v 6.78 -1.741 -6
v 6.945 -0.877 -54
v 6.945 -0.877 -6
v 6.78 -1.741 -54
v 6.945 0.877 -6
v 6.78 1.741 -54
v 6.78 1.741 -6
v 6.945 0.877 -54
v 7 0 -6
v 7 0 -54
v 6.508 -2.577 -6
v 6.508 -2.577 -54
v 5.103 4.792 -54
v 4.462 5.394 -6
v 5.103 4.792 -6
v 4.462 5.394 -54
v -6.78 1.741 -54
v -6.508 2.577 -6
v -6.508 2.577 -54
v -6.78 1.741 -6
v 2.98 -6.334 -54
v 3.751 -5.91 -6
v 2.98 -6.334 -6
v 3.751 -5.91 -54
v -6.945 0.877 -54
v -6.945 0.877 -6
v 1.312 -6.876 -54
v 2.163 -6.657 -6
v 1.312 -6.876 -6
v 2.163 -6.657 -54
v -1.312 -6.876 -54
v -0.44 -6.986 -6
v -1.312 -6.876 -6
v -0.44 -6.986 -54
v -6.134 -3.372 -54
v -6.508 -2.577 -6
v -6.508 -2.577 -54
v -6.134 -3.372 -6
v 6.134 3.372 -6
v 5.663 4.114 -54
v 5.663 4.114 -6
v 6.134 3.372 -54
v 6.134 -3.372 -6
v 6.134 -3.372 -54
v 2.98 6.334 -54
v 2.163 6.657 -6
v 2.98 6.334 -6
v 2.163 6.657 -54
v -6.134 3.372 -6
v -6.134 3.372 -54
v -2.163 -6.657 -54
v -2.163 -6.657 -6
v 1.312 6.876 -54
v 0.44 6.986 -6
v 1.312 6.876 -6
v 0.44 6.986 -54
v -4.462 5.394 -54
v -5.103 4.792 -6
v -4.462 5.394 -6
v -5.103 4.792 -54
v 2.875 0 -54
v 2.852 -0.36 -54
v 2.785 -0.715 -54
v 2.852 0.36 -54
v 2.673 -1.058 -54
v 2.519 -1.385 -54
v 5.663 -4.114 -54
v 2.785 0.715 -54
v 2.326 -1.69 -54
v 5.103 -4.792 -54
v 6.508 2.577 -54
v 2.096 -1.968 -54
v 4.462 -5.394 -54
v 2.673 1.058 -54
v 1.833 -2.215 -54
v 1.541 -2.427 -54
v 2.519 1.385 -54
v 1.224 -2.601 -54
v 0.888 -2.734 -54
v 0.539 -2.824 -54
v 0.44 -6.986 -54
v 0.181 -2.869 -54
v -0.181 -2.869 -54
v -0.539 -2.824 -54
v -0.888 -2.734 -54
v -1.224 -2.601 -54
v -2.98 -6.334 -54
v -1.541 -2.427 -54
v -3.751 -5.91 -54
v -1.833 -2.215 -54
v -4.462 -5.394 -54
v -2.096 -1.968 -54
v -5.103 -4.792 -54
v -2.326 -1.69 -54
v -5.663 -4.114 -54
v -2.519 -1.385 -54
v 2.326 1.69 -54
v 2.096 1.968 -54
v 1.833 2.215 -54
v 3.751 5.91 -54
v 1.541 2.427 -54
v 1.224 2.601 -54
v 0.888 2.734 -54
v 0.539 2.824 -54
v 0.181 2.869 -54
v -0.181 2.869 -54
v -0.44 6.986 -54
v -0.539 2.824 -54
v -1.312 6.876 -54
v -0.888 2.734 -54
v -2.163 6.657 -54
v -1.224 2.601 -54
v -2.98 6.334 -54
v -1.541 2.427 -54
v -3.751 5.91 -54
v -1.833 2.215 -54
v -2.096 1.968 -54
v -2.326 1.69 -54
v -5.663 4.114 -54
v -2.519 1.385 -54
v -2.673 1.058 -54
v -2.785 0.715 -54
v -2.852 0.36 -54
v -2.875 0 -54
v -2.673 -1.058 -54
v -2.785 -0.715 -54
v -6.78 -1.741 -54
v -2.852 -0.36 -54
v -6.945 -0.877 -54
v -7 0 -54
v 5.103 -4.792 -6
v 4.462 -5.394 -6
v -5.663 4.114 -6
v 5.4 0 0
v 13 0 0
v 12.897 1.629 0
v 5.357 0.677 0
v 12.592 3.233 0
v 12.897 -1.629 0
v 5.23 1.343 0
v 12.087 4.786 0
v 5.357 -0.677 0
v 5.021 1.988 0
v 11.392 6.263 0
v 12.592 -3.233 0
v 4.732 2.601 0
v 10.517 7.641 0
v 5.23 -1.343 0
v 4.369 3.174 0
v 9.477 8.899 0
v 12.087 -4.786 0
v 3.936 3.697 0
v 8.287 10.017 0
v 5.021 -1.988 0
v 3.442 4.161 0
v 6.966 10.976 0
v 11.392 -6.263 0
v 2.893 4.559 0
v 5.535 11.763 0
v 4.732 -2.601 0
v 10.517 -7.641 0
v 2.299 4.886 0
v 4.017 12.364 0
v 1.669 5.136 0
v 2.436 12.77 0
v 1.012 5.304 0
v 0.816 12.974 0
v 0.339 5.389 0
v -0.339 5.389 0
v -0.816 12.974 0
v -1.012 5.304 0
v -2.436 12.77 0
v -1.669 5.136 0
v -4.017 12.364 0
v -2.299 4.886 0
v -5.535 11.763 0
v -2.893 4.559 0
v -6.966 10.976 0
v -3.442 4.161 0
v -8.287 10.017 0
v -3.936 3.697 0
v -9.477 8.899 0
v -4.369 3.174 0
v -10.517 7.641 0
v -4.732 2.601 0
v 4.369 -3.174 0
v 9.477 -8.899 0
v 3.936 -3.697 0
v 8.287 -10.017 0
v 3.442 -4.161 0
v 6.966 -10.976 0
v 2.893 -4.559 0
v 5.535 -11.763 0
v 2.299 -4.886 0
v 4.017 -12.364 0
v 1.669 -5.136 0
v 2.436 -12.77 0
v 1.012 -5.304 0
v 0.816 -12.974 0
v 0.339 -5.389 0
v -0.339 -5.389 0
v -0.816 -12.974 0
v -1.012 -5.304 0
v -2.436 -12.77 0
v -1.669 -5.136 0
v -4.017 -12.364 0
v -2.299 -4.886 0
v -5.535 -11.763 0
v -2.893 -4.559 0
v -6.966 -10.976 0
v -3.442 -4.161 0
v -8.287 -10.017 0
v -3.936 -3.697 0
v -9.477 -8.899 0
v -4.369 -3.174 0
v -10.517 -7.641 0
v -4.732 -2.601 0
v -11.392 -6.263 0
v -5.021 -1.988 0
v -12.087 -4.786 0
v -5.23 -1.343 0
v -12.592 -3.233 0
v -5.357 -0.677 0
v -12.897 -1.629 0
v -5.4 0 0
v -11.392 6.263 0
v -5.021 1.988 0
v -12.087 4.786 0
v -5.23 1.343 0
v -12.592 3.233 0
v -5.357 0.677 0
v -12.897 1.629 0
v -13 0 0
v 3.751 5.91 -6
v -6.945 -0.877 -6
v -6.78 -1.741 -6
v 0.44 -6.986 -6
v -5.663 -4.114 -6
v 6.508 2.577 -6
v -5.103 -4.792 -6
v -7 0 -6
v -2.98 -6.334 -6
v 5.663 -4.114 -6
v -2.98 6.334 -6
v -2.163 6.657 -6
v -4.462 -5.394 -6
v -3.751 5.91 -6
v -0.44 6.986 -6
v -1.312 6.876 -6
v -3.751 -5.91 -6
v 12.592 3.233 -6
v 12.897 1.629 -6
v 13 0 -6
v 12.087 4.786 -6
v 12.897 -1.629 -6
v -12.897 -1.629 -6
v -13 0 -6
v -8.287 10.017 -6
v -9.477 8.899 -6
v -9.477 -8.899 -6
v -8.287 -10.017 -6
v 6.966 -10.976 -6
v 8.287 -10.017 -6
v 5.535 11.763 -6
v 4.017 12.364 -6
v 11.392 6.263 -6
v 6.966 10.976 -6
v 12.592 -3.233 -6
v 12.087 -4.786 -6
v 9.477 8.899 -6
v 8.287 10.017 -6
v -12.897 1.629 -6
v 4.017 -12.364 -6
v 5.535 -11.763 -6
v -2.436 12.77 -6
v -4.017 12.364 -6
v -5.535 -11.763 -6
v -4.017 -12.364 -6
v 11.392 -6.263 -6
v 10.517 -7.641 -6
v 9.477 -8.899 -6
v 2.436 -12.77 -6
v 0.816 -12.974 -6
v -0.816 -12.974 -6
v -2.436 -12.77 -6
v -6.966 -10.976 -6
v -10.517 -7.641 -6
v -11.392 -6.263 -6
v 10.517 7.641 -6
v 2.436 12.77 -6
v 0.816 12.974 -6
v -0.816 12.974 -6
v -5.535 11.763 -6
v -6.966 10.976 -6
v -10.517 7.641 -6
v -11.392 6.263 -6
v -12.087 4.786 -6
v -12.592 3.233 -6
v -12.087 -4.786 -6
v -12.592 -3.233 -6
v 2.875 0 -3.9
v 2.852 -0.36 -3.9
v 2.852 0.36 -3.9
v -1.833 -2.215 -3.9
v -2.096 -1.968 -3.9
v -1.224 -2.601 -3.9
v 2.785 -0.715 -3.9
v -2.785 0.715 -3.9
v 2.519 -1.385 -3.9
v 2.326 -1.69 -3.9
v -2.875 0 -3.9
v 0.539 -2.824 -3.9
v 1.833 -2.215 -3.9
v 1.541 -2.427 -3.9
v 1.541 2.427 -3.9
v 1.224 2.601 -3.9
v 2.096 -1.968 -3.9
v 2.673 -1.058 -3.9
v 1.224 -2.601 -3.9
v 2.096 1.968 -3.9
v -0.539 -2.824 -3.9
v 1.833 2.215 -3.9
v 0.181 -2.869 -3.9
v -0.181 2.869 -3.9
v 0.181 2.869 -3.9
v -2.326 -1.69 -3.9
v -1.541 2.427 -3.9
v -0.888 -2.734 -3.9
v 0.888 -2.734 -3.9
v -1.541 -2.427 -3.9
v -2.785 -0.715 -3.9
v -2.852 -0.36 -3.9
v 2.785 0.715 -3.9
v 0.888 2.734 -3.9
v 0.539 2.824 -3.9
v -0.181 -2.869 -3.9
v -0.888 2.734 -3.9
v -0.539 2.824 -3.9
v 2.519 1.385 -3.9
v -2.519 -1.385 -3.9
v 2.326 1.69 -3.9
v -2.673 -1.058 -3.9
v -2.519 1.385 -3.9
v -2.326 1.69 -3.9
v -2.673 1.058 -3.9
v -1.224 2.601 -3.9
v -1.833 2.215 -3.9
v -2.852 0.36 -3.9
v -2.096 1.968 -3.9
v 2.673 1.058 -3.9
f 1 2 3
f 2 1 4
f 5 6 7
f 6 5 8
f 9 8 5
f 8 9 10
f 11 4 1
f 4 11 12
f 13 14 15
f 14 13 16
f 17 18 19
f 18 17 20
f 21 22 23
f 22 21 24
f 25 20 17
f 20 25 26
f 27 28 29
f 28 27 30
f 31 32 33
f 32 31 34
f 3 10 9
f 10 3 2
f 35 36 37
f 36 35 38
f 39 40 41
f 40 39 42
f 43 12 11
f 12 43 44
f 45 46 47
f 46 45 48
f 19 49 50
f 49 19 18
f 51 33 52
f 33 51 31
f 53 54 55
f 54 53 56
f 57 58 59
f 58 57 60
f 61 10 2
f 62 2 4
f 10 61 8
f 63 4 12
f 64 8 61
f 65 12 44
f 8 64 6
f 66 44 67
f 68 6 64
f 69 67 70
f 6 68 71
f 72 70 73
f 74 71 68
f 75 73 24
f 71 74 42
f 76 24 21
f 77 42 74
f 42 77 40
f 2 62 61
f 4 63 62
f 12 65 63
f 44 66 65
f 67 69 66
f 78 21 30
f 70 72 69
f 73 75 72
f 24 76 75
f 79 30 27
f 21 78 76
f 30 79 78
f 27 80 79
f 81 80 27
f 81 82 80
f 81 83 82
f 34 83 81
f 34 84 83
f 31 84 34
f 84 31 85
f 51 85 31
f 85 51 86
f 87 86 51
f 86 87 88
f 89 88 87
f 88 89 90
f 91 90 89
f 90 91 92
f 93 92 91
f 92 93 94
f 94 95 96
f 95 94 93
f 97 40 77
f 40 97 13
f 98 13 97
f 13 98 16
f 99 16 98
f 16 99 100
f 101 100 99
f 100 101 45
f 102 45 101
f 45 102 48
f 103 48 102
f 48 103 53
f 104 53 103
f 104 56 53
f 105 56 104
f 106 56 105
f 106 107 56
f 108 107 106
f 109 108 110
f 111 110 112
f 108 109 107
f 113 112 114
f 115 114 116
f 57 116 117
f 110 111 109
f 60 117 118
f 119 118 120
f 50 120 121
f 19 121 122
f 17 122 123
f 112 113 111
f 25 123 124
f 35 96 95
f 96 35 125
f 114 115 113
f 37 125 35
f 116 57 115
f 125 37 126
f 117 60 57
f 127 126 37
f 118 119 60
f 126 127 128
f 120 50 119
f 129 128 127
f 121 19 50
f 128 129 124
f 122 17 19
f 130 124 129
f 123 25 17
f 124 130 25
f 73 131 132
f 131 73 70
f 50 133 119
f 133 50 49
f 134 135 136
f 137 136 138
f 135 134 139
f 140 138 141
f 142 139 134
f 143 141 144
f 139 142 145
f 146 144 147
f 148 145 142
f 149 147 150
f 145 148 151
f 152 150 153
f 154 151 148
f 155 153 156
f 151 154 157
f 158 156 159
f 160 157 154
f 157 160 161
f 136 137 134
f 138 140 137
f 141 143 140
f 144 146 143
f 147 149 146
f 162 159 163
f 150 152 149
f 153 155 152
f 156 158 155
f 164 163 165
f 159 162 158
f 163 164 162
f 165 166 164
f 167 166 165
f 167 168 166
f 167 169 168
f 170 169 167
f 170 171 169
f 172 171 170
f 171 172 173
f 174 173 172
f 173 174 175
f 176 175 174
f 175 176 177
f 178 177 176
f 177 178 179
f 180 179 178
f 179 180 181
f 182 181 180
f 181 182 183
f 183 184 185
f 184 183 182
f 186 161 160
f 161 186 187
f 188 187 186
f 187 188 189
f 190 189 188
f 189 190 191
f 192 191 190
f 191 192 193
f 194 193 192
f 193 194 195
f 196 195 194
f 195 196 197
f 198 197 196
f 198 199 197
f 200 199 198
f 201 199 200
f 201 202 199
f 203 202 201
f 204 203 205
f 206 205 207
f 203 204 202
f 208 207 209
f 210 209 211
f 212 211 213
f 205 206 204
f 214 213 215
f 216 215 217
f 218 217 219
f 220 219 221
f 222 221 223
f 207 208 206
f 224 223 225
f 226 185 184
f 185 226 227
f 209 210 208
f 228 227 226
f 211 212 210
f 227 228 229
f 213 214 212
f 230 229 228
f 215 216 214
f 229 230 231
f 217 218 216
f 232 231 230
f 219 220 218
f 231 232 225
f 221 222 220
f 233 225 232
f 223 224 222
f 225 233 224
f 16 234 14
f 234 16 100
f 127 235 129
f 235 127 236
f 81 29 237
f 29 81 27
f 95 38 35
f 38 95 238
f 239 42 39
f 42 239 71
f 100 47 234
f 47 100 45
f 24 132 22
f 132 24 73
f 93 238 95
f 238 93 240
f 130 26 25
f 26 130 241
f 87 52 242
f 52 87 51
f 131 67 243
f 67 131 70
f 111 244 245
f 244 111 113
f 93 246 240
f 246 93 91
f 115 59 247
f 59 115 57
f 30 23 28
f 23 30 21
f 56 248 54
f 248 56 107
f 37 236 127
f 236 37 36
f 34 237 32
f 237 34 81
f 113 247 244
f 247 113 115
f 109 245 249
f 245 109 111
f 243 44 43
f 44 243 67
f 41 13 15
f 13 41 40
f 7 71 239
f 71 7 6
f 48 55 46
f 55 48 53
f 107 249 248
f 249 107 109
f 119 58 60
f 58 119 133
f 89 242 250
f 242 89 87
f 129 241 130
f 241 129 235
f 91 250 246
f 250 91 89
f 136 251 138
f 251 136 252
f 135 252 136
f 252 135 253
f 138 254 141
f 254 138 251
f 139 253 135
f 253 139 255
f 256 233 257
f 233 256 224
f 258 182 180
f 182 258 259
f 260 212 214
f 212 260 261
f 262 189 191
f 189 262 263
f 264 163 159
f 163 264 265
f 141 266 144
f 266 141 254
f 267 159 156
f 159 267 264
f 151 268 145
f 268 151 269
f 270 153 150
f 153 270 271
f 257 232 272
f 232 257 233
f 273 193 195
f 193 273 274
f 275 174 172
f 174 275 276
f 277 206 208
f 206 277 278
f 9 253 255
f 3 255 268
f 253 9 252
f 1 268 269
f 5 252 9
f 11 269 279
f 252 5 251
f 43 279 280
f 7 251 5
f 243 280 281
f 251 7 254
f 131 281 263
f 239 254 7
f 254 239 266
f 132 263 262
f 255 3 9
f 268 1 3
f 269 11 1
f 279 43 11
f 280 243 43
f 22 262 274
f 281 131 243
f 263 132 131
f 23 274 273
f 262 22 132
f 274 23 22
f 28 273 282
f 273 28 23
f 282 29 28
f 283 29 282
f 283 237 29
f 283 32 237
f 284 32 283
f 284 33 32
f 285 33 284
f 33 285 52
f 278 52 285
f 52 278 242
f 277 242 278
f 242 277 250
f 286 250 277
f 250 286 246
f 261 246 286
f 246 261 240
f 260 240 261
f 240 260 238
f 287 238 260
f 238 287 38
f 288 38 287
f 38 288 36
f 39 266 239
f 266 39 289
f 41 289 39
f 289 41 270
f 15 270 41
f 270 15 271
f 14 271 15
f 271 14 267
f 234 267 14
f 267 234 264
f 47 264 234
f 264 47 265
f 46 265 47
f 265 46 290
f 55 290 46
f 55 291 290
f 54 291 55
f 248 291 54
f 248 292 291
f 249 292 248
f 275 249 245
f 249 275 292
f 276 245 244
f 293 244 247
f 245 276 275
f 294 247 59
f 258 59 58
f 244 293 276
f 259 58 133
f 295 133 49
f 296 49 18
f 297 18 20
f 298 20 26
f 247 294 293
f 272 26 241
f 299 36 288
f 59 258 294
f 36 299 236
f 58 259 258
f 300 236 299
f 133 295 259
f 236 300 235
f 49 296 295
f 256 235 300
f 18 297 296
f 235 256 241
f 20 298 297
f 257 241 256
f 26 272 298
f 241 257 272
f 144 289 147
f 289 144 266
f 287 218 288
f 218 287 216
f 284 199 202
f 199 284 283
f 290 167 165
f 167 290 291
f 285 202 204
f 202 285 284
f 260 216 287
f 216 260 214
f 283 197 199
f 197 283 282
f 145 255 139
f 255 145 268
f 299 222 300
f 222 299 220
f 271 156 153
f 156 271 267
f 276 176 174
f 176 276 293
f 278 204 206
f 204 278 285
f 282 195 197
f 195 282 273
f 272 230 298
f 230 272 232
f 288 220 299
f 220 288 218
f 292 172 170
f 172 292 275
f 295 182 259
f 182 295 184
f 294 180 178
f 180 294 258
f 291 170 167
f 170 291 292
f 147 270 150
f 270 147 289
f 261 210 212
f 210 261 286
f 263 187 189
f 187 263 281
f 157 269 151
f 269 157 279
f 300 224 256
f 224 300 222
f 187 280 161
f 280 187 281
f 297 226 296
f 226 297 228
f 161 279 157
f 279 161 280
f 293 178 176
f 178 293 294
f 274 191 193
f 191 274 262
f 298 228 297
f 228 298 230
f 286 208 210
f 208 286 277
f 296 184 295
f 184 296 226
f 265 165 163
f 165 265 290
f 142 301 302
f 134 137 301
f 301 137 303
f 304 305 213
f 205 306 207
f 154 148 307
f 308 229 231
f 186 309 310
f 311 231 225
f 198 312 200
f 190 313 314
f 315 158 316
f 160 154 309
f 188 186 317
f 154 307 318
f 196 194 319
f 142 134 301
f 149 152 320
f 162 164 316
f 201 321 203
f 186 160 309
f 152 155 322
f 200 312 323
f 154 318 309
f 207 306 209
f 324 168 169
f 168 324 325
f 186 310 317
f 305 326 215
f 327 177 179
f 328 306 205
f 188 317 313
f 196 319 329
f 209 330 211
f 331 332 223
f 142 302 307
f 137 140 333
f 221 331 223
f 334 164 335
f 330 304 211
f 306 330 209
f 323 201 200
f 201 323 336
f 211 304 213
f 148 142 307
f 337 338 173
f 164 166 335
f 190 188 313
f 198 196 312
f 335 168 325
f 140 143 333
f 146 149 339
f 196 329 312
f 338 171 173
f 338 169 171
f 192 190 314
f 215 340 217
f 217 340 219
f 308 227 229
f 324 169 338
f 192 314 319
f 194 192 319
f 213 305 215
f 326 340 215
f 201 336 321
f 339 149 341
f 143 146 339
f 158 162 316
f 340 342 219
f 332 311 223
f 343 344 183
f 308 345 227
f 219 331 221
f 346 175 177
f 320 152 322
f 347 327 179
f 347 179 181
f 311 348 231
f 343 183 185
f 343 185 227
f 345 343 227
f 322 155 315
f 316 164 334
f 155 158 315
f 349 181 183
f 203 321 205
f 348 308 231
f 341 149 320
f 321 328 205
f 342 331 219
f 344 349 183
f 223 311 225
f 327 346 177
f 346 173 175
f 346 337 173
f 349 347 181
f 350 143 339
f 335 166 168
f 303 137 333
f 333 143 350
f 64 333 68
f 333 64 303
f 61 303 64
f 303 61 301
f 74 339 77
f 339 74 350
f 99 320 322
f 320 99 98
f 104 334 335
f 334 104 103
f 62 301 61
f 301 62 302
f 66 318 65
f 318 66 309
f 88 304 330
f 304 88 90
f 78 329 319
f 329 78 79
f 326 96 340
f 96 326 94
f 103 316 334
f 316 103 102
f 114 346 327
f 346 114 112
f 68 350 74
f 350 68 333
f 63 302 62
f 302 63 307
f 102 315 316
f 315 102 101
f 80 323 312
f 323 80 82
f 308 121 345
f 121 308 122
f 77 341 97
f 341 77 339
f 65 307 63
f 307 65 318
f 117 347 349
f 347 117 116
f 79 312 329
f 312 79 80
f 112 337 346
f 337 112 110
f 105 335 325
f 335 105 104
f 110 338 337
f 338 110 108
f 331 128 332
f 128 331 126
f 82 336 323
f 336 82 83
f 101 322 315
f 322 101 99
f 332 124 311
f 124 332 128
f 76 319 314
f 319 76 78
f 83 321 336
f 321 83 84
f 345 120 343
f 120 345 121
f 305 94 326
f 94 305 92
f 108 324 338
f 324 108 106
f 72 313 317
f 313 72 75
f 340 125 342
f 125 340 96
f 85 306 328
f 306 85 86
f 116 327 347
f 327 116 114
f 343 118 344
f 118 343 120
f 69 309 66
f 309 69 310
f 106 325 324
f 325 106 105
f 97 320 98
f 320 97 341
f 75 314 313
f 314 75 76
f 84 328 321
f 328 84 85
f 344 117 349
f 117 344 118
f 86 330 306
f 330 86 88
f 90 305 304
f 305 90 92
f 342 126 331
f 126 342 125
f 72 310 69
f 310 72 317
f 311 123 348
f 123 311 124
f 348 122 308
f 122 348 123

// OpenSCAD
$fn = 50;


difference() {
	union() {
		translate(v = [0, 0, -54.0000000000]) {
			cylinder(h = 54, r = 7.0000000000);
		}
		translate(v = [0, 0, -6.0000000000]) {
			cylinder(h = 6, r = 13.0000000000);
		}
	}
	union() {
		translate(v = [0, 0, 0]) {
			rotate(a = [0, 0, 0]) {
				difference() {
					union() {
						#translate(v = [0, 0, -54.0000000000]) {
							cylinder(h = 54, r = 2.6000000000);
						}
						#translate(v = [0, 0, -3.9000000000]) {
							cylinder(h = 3.9000000000, r1 = 2.8750000000, r2 = 5.4000000000);
						}
						#translate(v = [0, 0, -54.0000000000]) {
							cylinder(h = 54, r = 2.8750000000);
						}
						#translate(v = [0, 0, -54.0000000000]) {
							cylinder(h = 54, r = 2.6000000000);
						}
					}
					union();
				}
			}
		}
	}
}
